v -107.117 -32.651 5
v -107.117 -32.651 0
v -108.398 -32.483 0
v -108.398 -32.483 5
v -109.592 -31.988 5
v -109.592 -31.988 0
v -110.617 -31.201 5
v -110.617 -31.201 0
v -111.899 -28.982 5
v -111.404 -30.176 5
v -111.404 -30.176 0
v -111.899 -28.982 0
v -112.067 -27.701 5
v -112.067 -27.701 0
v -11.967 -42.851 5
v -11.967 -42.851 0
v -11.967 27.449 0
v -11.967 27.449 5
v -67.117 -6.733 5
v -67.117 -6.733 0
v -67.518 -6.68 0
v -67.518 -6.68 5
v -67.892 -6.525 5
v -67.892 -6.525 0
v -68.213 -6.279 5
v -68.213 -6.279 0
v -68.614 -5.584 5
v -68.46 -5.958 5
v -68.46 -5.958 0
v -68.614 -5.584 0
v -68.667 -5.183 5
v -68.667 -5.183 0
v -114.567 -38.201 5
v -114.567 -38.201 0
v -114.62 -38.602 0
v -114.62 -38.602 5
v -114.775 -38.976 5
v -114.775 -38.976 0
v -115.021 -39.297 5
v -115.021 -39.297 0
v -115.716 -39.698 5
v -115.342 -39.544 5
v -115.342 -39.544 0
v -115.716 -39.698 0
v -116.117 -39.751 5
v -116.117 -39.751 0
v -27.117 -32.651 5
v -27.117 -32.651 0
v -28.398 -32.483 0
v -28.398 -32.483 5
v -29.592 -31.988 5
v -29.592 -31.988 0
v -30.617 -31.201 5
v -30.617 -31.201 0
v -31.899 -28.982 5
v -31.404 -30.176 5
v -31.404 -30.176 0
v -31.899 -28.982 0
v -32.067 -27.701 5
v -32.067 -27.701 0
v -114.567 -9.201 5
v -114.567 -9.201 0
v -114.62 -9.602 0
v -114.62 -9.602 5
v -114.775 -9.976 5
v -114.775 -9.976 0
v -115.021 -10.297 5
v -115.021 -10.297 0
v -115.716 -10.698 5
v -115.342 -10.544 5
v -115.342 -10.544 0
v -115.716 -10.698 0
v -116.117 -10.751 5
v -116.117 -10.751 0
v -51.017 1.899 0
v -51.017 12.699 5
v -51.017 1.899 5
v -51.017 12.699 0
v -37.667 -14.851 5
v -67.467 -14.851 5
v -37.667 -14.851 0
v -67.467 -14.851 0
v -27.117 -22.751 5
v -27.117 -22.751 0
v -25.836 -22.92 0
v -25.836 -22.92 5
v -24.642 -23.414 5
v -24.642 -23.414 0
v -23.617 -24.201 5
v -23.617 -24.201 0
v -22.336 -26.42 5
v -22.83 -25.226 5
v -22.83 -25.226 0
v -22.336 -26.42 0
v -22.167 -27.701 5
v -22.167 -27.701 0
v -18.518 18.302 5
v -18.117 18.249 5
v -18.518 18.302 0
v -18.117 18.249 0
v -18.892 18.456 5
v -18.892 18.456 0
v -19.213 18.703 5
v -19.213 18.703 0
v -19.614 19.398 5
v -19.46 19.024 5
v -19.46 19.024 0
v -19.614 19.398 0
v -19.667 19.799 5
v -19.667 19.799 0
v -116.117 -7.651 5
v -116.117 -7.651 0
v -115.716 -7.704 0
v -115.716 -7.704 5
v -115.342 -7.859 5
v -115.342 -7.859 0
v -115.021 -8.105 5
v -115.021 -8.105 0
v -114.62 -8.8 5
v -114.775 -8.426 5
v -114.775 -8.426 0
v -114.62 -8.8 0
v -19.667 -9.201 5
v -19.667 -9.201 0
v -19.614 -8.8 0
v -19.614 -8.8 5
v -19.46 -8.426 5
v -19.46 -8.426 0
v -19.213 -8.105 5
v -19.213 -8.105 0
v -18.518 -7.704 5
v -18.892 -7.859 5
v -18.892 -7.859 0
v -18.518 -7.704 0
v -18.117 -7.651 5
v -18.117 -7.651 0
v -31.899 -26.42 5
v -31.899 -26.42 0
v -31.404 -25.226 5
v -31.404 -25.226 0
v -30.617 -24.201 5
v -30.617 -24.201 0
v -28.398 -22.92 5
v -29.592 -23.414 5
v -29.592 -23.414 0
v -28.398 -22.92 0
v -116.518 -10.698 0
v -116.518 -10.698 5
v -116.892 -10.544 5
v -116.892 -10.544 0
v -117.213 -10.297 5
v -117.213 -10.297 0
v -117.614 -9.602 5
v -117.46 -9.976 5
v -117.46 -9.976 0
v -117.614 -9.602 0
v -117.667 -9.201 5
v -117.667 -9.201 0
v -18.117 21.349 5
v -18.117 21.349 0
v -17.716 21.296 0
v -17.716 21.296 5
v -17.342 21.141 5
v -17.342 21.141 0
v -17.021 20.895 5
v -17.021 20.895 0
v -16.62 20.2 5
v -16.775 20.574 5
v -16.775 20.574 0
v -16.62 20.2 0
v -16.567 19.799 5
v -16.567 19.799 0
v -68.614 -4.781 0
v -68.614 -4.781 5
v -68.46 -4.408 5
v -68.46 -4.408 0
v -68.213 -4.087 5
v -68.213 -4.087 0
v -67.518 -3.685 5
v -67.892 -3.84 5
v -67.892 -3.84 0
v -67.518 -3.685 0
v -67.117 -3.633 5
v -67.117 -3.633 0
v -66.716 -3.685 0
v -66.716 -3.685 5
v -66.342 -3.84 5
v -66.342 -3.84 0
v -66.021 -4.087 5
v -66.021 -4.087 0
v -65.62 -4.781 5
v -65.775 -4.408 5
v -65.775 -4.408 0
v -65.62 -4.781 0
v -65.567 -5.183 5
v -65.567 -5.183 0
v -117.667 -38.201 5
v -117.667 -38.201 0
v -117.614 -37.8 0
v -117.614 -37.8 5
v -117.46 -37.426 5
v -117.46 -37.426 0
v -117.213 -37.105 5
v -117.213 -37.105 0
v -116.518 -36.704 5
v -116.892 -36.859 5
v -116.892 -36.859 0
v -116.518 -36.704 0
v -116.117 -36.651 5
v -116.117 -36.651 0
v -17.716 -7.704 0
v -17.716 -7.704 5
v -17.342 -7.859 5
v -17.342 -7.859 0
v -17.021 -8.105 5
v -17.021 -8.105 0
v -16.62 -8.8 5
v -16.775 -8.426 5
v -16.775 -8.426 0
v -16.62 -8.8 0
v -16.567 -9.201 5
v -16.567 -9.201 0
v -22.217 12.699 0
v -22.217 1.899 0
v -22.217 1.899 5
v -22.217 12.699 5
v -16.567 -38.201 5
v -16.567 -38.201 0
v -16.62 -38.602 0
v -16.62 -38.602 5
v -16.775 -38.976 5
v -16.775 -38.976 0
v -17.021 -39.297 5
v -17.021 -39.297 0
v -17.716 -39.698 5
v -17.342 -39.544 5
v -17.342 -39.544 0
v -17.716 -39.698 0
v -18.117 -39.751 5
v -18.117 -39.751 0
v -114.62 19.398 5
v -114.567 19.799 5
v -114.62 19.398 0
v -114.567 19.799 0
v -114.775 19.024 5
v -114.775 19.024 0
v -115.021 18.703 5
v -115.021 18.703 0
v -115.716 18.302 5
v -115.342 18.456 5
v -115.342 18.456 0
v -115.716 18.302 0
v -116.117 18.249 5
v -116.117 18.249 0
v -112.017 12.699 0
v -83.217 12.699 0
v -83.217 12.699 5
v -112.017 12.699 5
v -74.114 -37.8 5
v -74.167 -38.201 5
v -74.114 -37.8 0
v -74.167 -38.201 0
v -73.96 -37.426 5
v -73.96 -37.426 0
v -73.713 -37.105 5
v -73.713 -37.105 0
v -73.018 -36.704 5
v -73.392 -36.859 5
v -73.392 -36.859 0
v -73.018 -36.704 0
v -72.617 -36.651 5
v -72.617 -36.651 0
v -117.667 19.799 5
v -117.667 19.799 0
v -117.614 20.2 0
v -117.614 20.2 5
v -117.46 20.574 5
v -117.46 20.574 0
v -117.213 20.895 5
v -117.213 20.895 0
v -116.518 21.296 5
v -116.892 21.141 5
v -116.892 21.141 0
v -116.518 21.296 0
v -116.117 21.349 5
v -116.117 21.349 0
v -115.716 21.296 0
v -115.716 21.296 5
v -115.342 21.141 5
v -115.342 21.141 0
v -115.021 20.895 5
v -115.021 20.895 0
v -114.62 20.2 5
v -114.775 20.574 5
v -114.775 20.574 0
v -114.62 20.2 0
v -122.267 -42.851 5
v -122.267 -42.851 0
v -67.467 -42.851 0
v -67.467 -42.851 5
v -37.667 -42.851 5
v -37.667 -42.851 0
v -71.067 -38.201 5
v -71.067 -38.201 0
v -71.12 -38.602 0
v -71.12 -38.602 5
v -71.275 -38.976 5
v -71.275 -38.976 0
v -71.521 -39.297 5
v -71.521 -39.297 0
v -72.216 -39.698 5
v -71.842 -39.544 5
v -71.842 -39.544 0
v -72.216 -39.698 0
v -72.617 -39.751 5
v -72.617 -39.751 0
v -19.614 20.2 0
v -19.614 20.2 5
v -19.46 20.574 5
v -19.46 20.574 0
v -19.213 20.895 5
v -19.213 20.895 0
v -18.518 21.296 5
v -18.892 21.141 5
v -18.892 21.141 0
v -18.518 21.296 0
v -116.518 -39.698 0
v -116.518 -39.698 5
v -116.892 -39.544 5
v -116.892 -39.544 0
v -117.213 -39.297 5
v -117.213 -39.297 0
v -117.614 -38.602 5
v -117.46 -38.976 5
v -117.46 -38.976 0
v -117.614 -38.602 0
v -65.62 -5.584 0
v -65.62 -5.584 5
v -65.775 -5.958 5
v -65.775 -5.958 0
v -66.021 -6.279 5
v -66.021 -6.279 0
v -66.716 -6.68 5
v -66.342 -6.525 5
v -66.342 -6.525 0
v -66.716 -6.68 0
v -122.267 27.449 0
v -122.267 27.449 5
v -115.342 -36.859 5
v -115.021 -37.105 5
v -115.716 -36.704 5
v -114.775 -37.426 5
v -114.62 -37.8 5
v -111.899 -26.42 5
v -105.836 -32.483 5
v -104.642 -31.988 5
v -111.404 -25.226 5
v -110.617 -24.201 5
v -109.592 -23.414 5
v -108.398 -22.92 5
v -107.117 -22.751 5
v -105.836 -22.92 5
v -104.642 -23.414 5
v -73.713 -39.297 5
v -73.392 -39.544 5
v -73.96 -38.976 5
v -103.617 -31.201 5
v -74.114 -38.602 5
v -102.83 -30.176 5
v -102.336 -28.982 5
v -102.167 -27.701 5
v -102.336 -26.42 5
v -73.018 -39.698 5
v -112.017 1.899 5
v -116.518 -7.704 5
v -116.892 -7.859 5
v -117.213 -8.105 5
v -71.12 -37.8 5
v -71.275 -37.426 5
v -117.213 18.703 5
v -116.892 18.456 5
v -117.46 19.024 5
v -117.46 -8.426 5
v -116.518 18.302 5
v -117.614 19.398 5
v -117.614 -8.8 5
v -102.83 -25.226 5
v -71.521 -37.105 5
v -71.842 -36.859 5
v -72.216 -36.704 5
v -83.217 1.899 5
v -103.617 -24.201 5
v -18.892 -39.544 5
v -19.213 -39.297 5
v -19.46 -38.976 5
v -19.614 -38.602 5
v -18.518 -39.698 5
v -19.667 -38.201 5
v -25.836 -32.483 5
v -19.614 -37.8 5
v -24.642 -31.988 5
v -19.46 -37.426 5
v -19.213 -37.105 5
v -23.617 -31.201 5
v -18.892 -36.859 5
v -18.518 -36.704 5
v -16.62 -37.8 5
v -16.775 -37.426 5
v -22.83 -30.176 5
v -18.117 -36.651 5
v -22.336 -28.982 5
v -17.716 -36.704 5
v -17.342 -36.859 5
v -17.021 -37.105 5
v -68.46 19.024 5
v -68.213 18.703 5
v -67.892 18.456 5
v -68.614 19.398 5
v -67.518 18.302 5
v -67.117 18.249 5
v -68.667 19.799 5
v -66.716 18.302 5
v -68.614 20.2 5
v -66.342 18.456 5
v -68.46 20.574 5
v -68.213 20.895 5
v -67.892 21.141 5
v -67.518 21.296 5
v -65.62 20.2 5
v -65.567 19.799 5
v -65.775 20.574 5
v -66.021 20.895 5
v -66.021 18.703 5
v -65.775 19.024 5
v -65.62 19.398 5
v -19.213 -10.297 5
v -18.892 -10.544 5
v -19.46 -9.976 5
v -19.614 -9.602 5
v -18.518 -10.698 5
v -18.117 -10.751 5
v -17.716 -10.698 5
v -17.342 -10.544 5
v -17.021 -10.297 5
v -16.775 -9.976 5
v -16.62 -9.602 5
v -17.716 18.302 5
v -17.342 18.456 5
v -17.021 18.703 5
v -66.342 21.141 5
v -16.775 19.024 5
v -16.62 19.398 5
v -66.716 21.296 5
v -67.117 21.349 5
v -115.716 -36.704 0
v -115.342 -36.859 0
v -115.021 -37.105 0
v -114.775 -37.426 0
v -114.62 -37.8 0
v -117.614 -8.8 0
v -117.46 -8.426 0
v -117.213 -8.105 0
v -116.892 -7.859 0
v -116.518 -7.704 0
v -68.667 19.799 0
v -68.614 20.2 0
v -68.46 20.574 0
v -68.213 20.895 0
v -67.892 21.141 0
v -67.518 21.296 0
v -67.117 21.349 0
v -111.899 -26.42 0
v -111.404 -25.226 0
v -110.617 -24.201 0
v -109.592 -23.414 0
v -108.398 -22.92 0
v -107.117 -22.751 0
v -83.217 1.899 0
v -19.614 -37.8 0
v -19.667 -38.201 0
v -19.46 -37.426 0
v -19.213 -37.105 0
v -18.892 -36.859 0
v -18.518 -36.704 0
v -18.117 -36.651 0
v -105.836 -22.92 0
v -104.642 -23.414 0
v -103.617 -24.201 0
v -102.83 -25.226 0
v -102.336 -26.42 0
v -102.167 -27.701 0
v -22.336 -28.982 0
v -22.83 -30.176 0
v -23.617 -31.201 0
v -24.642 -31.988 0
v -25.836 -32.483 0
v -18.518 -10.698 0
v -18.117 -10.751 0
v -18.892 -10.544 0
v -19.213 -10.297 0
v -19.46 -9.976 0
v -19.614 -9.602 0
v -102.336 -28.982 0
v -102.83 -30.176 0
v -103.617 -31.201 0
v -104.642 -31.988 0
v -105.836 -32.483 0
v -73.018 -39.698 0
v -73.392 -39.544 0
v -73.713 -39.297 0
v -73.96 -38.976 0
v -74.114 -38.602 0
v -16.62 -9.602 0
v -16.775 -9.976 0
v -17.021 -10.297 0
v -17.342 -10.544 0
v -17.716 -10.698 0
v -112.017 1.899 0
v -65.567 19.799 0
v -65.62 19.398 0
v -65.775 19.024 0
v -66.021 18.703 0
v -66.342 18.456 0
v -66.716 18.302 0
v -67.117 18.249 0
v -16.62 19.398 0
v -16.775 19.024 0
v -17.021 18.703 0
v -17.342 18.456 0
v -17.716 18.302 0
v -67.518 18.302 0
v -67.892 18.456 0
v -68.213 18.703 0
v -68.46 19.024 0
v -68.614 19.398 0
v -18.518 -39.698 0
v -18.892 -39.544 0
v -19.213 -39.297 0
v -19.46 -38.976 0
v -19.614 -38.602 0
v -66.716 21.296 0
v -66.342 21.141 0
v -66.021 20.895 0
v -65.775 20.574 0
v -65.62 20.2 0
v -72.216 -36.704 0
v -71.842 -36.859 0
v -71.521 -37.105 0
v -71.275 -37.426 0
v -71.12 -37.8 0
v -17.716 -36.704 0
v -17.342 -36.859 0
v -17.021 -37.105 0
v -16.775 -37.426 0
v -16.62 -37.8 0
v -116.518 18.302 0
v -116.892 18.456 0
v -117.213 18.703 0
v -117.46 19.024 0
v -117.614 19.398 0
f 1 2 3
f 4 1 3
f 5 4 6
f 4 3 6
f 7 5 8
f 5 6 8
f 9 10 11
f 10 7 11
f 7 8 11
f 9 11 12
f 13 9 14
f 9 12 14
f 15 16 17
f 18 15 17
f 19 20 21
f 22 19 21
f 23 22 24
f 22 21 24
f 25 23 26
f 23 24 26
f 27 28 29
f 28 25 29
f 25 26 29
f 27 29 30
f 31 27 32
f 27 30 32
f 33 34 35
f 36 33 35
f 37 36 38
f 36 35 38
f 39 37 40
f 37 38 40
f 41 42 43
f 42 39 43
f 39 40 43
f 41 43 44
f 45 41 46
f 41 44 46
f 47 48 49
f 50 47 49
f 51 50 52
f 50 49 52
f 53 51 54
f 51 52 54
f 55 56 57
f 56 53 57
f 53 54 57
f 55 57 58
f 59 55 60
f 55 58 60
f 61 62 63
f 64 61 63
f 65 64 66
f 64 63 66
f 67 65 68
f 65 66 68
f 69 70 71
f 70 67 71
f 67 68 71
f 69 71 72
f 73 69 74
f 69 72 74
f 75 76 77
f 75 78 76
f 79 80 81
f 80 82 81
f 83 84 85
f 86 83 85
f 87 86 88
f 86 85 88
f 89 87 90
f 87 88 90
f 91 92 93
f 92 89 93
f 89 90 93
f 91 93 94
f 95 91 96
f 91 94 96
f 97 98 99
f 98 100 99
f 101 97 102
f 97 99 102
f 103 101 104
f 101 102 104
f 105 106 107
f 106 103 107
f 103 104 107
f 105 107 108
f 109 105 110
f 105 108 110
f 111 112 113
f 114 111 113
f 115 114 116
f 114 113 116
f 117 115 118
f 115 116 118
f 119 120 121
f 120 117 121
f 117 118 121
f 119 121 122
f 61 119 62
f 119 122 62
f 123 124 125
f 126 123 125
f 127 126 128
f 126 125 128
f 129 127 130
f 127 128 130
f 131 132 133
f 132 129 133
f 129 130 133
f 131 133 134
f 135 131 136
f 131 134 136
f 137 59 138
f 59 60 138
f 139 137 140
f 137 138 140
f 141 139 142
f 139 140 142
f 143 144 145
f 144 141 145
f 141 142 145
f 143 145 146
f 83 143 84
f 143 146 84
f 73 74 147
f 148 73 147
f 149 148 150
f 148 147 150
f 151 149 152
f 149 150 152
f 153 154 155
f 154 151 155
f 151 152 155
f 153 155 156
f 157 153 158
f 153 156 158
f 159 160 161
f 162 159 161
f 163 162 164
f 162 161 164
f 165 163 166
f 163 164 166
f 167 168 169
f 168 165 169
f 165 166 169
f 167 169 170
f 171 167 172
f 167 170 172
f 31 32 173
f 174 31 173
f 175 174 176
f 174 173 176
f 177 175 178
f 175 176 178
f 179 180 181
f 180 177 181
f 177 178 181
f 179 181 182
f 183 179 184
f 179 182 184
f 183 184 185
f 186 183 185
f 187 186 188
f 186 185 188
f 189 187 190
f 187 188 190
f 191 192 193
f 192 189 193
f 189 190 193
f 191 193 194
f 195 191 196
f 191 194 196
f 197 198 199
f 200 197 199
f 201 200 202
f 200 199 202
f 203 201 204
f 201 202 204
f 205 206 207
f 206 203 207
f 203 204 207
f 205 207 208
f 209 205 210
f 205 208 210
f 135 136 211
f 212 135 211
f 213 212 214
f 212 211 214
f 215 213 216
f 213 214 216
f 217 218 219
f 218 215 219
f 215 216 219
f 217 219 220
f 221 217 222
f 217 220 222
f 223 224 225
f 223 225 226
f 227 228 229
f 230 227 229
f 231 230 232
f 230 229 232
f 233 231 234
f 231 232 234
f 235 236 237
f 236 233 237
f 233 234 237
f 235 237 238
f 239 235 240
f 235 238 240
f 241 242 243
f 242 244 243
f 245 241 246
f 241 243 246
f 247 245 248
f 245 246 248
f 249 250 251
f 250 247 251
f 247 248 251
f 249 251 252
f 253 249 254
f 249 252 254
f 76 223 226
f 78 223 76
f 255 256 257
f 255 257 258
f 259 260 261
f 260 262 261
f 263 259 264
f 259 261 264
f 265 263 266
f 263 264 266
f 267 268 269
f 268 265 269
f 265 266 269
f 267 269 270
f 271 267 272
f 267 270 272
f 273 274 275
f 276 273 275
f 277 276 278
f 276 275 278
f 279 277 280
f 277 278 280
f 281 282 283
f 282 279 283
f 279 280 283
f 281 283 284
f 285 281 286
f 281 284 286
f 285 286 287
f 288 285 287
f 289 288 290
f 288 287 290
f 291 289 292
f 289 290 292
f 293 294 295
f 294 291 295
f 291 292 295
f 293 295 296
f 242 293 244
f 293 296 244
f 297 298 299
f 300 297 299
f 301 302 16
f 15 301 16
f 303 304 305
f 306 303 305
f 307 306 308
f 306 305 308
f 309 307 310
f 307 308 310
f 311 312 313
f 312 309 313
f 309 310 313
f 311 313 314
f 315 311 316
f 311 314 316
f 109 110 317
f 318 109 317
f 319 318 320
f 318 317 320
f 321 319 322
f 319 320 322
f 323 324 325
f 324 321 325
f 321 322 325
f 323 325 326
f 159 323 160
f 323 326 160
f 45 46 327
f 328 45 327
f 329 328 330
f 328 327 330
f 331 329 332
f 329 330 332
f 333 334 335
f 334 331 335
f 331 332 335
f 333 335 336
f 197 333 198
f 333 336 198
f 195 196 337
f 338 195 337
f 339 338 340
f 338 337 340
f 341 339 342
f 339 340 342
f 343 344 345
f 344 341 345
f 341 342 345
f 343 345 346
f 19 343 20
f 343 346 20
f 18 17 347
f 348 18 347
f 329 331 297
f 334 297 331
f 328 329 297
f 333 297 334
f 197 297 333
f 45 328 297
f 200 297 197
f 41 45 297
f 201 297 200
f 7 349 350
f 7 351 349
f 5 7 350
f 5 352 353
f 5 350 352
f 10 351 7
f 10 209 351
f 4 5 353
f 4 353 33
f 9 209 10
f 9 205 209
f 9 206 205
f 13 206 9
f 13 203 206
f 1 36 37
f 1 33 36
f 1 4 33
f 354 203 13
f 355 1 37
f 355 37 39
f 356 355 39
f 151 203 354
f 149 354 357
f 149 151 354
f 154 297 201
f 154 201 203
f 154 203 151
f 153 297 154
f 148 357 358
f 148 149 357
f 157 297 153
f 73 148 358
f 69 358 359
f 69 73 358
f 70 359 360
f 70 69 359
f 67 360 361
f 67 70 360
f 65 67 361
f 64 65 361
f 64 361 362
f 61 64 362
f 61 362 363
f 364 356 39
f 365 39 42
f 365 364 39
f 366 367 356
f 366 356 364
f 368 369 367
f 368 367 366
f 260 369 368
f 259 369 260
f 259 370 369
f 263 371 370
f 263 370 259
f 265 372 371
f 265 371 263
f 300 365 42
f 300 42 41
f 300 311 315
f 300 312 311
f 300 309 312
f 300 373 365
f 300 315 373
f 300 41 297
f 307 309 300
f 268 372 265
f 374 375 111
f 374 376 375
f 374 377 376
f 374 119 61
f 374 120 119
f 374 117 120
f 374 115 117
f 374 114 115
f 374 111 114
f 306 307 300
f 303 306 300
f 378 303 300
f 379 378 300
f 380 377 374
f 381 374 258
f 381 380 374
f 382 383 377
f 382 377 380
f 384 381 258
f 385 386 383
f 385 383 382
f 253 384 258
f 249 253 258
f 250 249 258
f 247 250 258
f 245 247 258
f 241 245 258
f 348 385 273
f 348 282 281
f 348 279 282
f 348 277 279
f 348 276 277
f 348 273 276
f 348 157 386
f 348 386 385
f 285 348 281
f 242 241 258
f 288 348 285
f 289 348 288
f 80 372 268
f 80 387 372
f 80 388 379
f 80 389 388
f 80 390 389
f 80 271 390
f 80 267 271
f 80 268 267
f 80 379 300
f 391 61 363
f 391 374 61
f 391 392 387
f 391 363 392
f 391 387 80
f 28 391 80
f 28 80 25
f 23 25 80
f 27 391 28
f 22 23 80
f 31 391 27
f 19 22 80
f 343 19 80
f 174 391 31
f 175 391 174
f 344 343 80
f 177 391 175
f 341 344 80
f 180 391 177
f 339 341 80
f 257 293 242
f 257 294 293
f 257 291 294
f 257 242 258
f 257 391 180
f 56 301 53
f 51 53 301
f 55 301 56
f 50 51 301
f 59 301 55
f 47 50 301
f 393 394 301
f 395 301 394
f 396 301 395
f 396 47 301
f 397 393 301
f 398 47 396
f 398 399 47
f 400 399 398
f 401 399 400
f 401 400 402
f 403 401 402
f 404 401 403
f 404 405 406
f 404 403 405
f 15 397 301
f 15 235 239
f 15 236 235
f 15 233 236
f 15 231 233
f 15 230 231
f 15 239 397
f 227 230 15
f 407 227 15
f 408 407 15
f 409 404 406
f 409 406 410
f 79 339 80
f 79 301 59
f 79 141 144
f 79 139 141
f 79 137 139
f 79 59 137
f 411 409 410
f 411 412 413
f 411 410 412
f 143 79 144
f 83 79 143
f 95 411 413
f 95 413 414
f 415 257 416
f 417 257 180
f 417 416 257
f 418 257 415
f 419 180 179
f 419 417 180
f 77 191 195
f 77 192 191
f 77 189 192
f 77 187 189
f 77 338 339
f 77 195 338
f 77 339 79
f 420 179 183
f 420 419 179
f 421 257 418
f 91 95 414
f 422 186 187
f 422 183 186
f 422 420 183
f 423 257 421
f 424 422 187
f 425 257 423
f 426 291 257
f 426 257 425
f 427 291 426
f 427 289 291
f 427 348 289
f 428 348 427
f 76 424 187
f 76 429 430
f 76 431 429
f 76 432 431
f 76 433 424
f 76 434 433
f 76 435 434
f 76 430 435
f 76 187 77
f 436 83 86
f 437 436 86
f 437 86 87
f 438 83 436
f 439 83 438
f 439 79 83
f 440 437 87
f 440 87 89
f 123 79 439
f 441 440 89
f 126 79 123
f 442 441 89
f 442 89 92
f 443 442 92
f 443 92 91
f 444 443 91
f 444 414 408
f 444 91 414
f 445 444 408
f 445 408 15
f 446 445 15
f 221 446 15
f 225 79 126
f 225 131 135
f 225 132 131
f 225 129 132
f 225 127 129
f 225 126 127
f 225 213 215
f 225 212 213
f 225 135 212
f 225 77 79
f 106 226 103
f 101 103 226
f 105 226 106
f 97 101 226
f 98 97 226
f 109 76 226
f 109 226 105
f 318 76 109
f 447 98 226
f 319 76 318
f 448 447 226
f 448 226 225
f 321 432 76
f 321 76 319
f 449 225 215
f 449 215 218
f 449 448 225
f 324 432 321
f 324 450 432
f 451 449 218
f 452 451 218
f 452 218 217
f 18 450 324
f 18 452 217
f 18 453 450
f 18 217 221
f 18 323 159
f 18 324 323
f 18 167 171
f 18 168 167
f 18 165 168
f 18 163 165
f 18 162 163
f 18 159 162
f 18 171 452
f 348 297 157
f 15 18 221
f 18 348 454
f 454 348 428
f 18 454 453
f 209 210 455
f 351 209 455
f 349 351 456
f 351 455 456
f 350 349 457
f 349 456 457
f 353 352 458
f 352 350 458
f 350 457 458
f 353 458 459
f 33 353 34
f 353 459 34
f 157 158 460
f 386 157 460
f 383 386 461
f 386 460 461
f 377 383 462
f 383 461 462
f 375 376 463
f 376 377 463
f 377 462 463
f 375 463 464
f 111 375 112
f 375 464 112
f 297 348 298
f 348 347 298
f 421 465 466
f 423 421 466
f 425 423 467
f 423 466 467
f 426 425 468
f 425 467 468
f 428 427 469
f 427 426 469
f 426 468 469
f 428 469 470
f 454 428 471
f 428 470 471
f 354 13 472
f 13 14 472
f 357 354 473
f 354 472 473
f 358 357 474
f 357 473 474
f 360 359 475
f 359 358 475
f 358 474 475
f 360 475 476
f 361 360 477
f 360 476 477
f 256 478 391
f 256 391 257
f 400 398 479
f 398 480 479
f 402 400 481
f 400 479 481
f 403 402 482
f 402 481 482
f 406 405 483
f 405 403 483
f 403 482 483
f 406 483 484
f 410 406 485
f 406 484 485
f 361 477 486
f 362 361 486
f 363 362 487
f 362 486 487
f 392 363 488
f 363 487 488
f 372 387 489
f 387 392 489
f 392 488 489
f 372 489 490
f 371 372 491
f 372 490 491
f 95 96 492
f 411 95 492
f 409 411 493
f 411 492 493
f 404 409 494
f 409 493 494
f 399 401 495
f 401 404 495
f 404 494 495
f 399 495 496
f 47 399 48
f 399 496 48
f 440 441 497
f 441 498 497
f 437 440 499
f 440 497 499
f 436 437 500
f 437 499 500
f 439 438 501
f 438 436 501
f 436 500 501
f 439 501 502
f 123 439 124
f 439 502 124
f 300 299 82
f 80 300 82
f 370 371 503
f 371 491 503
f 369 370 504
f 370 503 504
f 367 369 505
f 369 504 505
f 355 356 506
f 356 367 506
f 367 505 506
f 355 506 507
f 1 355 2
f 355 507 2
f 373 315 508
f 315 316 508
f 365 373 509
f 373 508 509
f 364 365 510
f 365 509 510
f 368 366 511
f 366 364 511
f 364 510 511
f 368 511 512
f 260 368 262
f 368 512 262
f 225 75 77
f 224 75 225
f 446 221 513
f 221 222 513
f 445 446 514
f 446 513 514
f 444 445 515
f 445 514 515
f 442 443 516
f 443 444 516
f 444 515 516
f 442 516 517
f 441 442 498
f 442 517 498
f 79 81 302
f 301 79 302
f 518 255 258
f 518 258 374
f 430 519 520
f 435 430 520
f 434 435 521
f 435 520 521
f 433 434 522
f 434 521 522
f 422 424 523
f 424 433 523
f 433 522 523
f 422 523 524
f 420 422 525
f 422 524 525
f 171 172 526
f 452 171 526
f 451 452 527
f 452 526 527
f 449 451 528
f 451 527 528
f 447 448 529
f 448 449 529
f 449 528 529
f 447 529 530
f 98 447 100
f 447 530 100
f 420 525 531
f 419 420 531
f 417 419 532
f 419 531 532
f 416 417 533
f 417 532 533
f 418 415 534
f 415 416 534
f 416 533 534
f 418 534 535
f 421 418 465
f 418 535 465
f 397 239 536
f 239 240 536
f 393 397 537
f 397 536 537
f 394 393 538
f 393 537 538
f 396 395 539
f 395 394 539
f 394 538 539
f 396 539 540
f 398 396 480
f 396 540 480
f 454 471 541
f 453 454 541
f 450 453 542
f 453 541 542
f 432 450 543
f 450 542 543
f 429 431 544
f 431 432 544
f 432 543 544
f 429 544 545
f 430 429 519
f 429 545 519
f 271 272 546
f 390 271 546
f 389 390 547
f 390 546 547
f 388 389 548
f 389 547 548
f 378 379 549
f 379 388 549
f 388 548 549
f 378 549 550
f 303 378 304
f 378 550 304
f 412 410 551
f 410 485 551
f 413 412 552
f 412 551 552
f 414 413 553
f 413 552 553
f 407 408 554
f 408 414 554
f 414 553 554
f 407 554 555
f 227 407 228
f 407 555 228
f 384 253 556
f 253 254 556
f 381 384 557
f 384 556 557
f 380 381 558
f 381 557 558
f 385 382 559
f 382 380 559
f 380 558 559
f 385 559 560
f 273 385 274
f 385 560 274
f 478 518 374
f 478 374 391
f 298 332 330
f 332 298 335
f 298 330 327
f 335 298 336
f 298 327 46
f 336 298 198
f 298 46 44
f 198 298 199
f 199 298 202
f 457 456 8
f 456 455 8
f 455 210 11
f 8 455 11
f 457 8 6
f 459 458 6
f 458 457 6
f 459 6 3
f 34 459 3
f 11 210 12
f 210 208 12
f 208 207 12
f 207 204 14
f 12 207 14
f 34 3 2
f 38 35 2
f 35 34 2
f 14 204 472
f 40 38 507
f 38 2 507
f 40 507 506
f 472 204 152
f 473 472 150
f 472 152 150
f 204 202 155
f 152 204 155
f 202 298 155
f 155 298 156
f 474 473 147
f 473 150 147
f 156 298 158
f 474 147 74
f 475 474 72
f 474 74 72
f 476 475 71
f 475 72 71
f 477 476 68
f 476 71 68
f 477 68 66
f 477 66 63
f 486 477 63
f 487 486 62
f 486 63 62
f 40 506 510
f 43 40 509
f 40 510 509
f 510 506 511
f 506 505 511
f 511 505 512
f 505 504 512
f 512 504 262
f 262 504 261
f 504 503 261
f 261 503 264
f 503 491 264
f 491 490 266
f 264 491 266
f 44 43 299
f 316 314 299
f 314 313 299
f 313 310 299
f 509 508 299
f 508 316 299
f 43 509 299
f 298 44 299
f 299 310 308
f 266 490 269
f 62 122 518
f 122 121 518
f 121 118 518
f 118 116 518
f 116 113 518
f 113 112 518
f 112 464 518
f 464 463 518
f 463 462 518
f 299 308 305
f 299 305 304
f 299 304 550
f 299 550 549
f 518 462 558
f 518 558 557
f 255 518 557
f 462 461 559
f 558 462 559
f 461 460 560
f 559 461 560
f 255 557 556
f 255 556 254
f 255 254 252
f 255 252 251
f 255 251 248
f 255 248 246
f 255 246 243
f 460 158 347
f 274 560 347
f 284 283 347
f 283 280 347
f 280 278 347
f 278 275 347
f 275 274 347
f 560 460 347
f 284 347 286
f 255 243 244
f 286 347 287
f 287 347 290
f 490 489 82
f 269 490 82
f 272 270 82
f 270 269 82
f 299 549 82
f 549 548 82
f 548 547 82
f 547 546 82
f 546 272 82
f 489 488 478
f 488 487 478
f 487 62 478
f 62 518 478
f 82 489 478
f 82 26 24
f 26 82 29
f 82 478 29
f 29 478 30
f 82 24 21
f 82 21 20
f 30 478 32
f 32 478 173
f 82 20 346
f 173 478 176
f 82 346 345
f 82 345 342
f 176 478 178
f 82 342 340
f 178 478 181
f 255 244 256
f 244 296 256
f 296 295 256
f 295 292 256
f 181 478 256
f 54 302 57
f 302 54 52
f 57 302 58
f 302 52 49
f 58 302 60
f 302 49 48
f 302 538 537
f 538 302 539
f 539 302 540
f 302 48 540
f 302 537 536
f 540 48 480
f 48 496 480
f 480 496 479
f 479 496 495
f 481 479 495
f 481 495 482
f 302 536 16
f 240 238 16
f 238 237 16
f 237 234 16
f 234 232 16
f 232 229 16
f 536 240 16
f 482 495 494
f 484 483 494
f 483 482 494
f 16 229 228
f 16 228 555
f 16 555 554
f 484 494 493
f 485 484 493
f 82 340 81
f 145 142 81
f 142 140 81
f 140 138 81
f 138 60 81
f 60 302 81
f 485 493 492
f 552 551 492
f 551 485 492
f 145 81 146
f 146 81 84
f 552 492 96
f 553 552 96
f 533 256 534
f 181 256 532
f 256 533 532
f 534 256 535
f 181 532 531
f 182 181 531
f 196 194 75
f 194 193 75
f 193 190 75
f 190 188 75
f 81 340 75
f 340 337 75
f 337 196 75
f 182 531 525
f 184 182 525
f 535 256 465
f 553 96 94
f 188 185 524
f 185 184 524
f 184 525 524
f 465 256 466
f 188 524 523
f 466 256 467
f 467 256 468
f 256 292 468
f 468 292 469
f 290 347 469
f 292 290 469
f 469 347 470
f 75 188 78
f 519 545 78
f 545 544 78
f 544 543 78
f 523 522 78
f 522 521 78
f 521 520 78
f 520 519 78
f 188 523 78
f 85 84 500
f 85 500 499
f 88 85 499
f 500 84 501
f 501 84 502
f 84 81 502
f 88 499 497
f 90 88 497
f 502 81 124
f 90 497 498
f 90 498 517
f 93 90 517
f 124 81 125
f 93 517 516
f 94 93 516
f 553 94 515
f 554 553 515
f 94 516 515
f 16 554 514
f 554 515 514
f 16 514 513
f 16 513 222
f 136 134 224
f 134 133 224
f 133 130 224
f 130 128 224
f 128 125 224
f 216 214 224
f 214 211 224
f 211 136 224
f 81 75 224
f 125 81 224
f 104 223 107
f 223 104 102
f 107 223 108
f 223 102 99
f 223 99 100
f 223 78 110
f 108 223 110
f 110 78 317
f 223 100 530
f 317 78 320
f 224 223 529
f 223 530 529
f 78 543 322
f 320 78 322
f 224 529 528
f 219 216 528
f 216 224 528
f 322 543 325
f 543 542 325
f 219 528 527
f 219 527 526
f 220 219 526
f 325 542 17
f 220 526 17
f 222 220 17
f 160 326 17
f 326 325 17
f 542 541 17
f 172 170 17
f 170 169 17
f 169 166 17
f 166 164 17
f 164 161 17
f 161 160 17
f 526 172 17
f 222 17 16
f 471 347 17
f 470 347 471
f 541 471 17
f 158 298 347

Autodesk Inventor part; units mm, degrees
ref_plane "YZ Plane" through (0, 0, 0) normal (1, 0, 0) x (0, 1, 0)
ref_plane "XZ Plane" through (0, 0, 0) normal (0, 1, 0) x (-1, 0, 0)
ref_plane "XY Plane" through (0, 0, 0) normal (0, 0, 1) x (1, 0, 0)
sketch "Boceto1" plane through (0, 0, 0) normal (0, 0, 1) x (1, 0, 0)
  arc A0 (-18.1173, 21.3488) -> (-19.6673, 19.7988) centre (-18.1173, 19.7988) ccw
  arc A1 (-19.6673, 19.7988) -> (-18.1173, 18.2488) centre (-18.1173, 19.7988) ccw
  arc A2 (-18.1173, 18.2488) -> (-16.5673, 19.7988) centre (-18.1173, 19.7988) ccw
  arc A3 (-16.5673, 19.7988) -> (-18.1173, 21.3488) centre (-18.1173, 19.7988) ccw
  arc A4 (-18.1173, -7.6512) -> (-19.6673, -9.2012) centre (-18.1173, -9.2012) ccw
  arc A5 (-19.6673, -9.2012) -> (-18.1173, -10.7512) centre (-18.1173, -9.2012) ccw
  arc A6 (-18.1173, -10.7512) -> (-16.5673, -9.2012) centre (-18.1173, -9.2012) ccw
  arc A7 (-16.5673, -9.2012) -> (-18.1173, -7.6512) centre (-18.1173, -9.2012) ccw
  arc A8 (-18.1173, -36.6512) -> (-19.6673, -38.2012) centre (-18.1173, -38.2012) ccw
  arc A9 (-19.6673, -38.2012) -> (-18.1173, -39.7512) centre (-18.1173, -38.2012) ccw
  arc A10 (-18.1173, -39.7512) -> (-16.5673, -38.2012) centre (-18.1173, -38.2012) ccw
  arc A11 (-16.5673, -38.2012) -> (-18.1173, -36.6512) centre (-18.1173, -38.2012) ccw
  arc A12 (-67.1173, 21.3488) -> (-68.6673, 19.7988) centre (-67.1173, 19.7988) ccw
  arc A13 (-68.6673, 19.7988) -> (-67.1173, 18.2488) centre (-67.1173, 19.7988) ccw
  arc A14 (-67.1173, 18.2488) -> (-65.5673, 19.7988) centre (-67.1173, 19.7988) ccw
  arc A15 (-65.5673, 19.7988) -> (-67.1173, 21.3488) centre (-67.1173, 19.7988) ccw
  arc A16 (-67.1173, -3.6326) -> (-68.6673, -5.1826) centre (-67.1173, -5.1826) ccw
  arc A17 (-68.6673, -5.1826) -> (-67.1173, -6.7326) centre (-67.1173, -5.1826) ccw
  arc A18 (-67.1173, -6.7326) -> (-65.5673, -5.1826) centre (-67.1173, -5.1826) ccw
  arc A19 (-65.5673, -5.1826) -> (-67.1173, -3.6326) centre (-67.1173, -5.1826) ccw
  arc A20 (-72.6173, -36.6512) -> (-74.1673, -38.2012) centre (-72.6173, -38.2012) ccw
  arc A21 (-74.1673, -38.2012) -> (-72.6173, -39.7512) centre (-72.6173, -38.2012) ccw
  arc A22 (-72.6173, -39.7512) -> (-71.0673, -38.2012) centre (-72.6173, -38.2012) ccw
  arc A23 (-71.0673, -38.2012) -> (-72.6173, -36.6512) centre (-72.6173, -38.2012) ccw
  arc A24 (-116.1173, 21.3488) -> (-117.6673, 19.7988) centre (-116.1173, 19.7988) ccw
  arc A25 (-117.6673, 19.7988) -> (-116.1173, 18.2488) centre (-116.1173, 19.7988) ccw
  arc A26 (-116.1173, 18.2488) -> (-114.5673, 19.7988) centre (-116.1173, 19.7988) ccw
  arc A27 (-114.5673, 19.7988) -> (-116.1173, 21.3488) centre (-116.1173, 19.7988) ccw
  arc A28 (-116.1173, -7.6512) -> (-117.6673, -9.2012) centre (-116.1173, -9.2012) ccw
  arc A29 (-117.6673, -9.2012) -> (-116.1173, -10.7512) centre (-116.1173, -9.2012) ccw
  arc A30 (-116.1173, -10.7512) -> (-114.5673, -9.2012) centre (-116.1173, -9.2012) ccw
  arc A31 (-114.5673, -9.2012) -> (-116.1173, -7.6512) centre (-116.1173, -9.2012) ccw
  arc A32 (-116.1173, -36.6512) -> (-117.6673, -38.2012) centre (-116.1173, -38.2012) ccw
  arc A33 (-117.6673, -38.2012) -> (-116.1173, -39.7512) centre (-116.1173, -38.2012) ccw
  arc A34 (-116.1173, -39.7512) -> (-114.5673, -38.2012) centre (-116.1173, -38.2012) ccw
  arc A35 (-114.5673, -38.2012) -> (-116.1173, -36.6512) centre (-116.1173, -38.2012) ccw
  arc A36 (-107.1173, -22.7512) -> (-112.0673, -27.7012) centre (-107.1173, -27.7012) ccw
  arc A37 (-112.0673, -27.7012) -> (-107.1173, -32.6512) centre (-107.1173, -27.7012) ccw
  arc A38 (-107.1173, -32.6512) -> (-102.1673, -27.7012) centre (-107.1173, -27.7012) ccw
  arc A39 (-102.1673, -27.7012) -> (-107.1173, -22.7512) centre (-107.1173, -27.7012) ccw
  arc A40 (-27.1173, -22.7512) -> (-32.0673, -27.7012) centre (-27.1173, -27.7012) ccw
  arc A41 (-32.0673, -27.7012) -> (-27.1173, -32.6512) centre (-27.1173, -27.7012) ccw
  arc A42 (-27.1173, -32.6512) -> (-22.1673, -27.7012) centre (-27.1173, -27.7012) ccw
  arc A43 (-22.1673, -27.7012) -> (-27.1173, -22.7512) centre (-27.1173, -27.7012) ccw
  line L0 (-83.2173, 1.8988) -> (-83.2173, 12.6988)
  line L1 (-83.2173, 12.6988) -> (-112.0173, 12.6988)
  line L2 (-112.0173, 12.6988) -> (-112.0173, 1.8988)
  line L3 (-112.0173, 1.8988) -> (-83.2173, 1.8988)
  line L4 (-22.2173, 1.8988) -> (-22.2173, 12.6988)
  line L5 (-22.2173, 12.6988) -> (-51.0173, 12.6988)
  line L6 (-51.0173, 12.6988) -> (-51.0173, 1.8988)
  line L7 (-51.0173, 1.8988) -> (-22.2173, 1.8988)
  line L8 (-67.4673, -14.8512) -> (-37.6673, -14.8512)
  line L9 (-37.6673, -14.8512) -> (-37.6673, -42.8512)
  line L10 (-37.6673, -42.8512) -> (-11.9673, -42.8512)
  line L11 (-11.9673, -42.8512) -> (-11.9673, 27.4488)
  line L12 (-11.9673, 27.4488) -> (-122.2673, 27.4488)
  line L13 (-122.2673, 27.4488) -> (-122.2673, -42.8512)
  line L14 (-122.2673, -42.8512) -> (-67.4673, -42.8512)
  line L15 (-67.4673, -42.8512) -> (-67.4673, -14.8512)
  point P0 (0, 0)
extrude "Extrusión1" add sketch "Boceto1" along normal blind 5
properties part number "carro x lado polea pieza4 tapa"
